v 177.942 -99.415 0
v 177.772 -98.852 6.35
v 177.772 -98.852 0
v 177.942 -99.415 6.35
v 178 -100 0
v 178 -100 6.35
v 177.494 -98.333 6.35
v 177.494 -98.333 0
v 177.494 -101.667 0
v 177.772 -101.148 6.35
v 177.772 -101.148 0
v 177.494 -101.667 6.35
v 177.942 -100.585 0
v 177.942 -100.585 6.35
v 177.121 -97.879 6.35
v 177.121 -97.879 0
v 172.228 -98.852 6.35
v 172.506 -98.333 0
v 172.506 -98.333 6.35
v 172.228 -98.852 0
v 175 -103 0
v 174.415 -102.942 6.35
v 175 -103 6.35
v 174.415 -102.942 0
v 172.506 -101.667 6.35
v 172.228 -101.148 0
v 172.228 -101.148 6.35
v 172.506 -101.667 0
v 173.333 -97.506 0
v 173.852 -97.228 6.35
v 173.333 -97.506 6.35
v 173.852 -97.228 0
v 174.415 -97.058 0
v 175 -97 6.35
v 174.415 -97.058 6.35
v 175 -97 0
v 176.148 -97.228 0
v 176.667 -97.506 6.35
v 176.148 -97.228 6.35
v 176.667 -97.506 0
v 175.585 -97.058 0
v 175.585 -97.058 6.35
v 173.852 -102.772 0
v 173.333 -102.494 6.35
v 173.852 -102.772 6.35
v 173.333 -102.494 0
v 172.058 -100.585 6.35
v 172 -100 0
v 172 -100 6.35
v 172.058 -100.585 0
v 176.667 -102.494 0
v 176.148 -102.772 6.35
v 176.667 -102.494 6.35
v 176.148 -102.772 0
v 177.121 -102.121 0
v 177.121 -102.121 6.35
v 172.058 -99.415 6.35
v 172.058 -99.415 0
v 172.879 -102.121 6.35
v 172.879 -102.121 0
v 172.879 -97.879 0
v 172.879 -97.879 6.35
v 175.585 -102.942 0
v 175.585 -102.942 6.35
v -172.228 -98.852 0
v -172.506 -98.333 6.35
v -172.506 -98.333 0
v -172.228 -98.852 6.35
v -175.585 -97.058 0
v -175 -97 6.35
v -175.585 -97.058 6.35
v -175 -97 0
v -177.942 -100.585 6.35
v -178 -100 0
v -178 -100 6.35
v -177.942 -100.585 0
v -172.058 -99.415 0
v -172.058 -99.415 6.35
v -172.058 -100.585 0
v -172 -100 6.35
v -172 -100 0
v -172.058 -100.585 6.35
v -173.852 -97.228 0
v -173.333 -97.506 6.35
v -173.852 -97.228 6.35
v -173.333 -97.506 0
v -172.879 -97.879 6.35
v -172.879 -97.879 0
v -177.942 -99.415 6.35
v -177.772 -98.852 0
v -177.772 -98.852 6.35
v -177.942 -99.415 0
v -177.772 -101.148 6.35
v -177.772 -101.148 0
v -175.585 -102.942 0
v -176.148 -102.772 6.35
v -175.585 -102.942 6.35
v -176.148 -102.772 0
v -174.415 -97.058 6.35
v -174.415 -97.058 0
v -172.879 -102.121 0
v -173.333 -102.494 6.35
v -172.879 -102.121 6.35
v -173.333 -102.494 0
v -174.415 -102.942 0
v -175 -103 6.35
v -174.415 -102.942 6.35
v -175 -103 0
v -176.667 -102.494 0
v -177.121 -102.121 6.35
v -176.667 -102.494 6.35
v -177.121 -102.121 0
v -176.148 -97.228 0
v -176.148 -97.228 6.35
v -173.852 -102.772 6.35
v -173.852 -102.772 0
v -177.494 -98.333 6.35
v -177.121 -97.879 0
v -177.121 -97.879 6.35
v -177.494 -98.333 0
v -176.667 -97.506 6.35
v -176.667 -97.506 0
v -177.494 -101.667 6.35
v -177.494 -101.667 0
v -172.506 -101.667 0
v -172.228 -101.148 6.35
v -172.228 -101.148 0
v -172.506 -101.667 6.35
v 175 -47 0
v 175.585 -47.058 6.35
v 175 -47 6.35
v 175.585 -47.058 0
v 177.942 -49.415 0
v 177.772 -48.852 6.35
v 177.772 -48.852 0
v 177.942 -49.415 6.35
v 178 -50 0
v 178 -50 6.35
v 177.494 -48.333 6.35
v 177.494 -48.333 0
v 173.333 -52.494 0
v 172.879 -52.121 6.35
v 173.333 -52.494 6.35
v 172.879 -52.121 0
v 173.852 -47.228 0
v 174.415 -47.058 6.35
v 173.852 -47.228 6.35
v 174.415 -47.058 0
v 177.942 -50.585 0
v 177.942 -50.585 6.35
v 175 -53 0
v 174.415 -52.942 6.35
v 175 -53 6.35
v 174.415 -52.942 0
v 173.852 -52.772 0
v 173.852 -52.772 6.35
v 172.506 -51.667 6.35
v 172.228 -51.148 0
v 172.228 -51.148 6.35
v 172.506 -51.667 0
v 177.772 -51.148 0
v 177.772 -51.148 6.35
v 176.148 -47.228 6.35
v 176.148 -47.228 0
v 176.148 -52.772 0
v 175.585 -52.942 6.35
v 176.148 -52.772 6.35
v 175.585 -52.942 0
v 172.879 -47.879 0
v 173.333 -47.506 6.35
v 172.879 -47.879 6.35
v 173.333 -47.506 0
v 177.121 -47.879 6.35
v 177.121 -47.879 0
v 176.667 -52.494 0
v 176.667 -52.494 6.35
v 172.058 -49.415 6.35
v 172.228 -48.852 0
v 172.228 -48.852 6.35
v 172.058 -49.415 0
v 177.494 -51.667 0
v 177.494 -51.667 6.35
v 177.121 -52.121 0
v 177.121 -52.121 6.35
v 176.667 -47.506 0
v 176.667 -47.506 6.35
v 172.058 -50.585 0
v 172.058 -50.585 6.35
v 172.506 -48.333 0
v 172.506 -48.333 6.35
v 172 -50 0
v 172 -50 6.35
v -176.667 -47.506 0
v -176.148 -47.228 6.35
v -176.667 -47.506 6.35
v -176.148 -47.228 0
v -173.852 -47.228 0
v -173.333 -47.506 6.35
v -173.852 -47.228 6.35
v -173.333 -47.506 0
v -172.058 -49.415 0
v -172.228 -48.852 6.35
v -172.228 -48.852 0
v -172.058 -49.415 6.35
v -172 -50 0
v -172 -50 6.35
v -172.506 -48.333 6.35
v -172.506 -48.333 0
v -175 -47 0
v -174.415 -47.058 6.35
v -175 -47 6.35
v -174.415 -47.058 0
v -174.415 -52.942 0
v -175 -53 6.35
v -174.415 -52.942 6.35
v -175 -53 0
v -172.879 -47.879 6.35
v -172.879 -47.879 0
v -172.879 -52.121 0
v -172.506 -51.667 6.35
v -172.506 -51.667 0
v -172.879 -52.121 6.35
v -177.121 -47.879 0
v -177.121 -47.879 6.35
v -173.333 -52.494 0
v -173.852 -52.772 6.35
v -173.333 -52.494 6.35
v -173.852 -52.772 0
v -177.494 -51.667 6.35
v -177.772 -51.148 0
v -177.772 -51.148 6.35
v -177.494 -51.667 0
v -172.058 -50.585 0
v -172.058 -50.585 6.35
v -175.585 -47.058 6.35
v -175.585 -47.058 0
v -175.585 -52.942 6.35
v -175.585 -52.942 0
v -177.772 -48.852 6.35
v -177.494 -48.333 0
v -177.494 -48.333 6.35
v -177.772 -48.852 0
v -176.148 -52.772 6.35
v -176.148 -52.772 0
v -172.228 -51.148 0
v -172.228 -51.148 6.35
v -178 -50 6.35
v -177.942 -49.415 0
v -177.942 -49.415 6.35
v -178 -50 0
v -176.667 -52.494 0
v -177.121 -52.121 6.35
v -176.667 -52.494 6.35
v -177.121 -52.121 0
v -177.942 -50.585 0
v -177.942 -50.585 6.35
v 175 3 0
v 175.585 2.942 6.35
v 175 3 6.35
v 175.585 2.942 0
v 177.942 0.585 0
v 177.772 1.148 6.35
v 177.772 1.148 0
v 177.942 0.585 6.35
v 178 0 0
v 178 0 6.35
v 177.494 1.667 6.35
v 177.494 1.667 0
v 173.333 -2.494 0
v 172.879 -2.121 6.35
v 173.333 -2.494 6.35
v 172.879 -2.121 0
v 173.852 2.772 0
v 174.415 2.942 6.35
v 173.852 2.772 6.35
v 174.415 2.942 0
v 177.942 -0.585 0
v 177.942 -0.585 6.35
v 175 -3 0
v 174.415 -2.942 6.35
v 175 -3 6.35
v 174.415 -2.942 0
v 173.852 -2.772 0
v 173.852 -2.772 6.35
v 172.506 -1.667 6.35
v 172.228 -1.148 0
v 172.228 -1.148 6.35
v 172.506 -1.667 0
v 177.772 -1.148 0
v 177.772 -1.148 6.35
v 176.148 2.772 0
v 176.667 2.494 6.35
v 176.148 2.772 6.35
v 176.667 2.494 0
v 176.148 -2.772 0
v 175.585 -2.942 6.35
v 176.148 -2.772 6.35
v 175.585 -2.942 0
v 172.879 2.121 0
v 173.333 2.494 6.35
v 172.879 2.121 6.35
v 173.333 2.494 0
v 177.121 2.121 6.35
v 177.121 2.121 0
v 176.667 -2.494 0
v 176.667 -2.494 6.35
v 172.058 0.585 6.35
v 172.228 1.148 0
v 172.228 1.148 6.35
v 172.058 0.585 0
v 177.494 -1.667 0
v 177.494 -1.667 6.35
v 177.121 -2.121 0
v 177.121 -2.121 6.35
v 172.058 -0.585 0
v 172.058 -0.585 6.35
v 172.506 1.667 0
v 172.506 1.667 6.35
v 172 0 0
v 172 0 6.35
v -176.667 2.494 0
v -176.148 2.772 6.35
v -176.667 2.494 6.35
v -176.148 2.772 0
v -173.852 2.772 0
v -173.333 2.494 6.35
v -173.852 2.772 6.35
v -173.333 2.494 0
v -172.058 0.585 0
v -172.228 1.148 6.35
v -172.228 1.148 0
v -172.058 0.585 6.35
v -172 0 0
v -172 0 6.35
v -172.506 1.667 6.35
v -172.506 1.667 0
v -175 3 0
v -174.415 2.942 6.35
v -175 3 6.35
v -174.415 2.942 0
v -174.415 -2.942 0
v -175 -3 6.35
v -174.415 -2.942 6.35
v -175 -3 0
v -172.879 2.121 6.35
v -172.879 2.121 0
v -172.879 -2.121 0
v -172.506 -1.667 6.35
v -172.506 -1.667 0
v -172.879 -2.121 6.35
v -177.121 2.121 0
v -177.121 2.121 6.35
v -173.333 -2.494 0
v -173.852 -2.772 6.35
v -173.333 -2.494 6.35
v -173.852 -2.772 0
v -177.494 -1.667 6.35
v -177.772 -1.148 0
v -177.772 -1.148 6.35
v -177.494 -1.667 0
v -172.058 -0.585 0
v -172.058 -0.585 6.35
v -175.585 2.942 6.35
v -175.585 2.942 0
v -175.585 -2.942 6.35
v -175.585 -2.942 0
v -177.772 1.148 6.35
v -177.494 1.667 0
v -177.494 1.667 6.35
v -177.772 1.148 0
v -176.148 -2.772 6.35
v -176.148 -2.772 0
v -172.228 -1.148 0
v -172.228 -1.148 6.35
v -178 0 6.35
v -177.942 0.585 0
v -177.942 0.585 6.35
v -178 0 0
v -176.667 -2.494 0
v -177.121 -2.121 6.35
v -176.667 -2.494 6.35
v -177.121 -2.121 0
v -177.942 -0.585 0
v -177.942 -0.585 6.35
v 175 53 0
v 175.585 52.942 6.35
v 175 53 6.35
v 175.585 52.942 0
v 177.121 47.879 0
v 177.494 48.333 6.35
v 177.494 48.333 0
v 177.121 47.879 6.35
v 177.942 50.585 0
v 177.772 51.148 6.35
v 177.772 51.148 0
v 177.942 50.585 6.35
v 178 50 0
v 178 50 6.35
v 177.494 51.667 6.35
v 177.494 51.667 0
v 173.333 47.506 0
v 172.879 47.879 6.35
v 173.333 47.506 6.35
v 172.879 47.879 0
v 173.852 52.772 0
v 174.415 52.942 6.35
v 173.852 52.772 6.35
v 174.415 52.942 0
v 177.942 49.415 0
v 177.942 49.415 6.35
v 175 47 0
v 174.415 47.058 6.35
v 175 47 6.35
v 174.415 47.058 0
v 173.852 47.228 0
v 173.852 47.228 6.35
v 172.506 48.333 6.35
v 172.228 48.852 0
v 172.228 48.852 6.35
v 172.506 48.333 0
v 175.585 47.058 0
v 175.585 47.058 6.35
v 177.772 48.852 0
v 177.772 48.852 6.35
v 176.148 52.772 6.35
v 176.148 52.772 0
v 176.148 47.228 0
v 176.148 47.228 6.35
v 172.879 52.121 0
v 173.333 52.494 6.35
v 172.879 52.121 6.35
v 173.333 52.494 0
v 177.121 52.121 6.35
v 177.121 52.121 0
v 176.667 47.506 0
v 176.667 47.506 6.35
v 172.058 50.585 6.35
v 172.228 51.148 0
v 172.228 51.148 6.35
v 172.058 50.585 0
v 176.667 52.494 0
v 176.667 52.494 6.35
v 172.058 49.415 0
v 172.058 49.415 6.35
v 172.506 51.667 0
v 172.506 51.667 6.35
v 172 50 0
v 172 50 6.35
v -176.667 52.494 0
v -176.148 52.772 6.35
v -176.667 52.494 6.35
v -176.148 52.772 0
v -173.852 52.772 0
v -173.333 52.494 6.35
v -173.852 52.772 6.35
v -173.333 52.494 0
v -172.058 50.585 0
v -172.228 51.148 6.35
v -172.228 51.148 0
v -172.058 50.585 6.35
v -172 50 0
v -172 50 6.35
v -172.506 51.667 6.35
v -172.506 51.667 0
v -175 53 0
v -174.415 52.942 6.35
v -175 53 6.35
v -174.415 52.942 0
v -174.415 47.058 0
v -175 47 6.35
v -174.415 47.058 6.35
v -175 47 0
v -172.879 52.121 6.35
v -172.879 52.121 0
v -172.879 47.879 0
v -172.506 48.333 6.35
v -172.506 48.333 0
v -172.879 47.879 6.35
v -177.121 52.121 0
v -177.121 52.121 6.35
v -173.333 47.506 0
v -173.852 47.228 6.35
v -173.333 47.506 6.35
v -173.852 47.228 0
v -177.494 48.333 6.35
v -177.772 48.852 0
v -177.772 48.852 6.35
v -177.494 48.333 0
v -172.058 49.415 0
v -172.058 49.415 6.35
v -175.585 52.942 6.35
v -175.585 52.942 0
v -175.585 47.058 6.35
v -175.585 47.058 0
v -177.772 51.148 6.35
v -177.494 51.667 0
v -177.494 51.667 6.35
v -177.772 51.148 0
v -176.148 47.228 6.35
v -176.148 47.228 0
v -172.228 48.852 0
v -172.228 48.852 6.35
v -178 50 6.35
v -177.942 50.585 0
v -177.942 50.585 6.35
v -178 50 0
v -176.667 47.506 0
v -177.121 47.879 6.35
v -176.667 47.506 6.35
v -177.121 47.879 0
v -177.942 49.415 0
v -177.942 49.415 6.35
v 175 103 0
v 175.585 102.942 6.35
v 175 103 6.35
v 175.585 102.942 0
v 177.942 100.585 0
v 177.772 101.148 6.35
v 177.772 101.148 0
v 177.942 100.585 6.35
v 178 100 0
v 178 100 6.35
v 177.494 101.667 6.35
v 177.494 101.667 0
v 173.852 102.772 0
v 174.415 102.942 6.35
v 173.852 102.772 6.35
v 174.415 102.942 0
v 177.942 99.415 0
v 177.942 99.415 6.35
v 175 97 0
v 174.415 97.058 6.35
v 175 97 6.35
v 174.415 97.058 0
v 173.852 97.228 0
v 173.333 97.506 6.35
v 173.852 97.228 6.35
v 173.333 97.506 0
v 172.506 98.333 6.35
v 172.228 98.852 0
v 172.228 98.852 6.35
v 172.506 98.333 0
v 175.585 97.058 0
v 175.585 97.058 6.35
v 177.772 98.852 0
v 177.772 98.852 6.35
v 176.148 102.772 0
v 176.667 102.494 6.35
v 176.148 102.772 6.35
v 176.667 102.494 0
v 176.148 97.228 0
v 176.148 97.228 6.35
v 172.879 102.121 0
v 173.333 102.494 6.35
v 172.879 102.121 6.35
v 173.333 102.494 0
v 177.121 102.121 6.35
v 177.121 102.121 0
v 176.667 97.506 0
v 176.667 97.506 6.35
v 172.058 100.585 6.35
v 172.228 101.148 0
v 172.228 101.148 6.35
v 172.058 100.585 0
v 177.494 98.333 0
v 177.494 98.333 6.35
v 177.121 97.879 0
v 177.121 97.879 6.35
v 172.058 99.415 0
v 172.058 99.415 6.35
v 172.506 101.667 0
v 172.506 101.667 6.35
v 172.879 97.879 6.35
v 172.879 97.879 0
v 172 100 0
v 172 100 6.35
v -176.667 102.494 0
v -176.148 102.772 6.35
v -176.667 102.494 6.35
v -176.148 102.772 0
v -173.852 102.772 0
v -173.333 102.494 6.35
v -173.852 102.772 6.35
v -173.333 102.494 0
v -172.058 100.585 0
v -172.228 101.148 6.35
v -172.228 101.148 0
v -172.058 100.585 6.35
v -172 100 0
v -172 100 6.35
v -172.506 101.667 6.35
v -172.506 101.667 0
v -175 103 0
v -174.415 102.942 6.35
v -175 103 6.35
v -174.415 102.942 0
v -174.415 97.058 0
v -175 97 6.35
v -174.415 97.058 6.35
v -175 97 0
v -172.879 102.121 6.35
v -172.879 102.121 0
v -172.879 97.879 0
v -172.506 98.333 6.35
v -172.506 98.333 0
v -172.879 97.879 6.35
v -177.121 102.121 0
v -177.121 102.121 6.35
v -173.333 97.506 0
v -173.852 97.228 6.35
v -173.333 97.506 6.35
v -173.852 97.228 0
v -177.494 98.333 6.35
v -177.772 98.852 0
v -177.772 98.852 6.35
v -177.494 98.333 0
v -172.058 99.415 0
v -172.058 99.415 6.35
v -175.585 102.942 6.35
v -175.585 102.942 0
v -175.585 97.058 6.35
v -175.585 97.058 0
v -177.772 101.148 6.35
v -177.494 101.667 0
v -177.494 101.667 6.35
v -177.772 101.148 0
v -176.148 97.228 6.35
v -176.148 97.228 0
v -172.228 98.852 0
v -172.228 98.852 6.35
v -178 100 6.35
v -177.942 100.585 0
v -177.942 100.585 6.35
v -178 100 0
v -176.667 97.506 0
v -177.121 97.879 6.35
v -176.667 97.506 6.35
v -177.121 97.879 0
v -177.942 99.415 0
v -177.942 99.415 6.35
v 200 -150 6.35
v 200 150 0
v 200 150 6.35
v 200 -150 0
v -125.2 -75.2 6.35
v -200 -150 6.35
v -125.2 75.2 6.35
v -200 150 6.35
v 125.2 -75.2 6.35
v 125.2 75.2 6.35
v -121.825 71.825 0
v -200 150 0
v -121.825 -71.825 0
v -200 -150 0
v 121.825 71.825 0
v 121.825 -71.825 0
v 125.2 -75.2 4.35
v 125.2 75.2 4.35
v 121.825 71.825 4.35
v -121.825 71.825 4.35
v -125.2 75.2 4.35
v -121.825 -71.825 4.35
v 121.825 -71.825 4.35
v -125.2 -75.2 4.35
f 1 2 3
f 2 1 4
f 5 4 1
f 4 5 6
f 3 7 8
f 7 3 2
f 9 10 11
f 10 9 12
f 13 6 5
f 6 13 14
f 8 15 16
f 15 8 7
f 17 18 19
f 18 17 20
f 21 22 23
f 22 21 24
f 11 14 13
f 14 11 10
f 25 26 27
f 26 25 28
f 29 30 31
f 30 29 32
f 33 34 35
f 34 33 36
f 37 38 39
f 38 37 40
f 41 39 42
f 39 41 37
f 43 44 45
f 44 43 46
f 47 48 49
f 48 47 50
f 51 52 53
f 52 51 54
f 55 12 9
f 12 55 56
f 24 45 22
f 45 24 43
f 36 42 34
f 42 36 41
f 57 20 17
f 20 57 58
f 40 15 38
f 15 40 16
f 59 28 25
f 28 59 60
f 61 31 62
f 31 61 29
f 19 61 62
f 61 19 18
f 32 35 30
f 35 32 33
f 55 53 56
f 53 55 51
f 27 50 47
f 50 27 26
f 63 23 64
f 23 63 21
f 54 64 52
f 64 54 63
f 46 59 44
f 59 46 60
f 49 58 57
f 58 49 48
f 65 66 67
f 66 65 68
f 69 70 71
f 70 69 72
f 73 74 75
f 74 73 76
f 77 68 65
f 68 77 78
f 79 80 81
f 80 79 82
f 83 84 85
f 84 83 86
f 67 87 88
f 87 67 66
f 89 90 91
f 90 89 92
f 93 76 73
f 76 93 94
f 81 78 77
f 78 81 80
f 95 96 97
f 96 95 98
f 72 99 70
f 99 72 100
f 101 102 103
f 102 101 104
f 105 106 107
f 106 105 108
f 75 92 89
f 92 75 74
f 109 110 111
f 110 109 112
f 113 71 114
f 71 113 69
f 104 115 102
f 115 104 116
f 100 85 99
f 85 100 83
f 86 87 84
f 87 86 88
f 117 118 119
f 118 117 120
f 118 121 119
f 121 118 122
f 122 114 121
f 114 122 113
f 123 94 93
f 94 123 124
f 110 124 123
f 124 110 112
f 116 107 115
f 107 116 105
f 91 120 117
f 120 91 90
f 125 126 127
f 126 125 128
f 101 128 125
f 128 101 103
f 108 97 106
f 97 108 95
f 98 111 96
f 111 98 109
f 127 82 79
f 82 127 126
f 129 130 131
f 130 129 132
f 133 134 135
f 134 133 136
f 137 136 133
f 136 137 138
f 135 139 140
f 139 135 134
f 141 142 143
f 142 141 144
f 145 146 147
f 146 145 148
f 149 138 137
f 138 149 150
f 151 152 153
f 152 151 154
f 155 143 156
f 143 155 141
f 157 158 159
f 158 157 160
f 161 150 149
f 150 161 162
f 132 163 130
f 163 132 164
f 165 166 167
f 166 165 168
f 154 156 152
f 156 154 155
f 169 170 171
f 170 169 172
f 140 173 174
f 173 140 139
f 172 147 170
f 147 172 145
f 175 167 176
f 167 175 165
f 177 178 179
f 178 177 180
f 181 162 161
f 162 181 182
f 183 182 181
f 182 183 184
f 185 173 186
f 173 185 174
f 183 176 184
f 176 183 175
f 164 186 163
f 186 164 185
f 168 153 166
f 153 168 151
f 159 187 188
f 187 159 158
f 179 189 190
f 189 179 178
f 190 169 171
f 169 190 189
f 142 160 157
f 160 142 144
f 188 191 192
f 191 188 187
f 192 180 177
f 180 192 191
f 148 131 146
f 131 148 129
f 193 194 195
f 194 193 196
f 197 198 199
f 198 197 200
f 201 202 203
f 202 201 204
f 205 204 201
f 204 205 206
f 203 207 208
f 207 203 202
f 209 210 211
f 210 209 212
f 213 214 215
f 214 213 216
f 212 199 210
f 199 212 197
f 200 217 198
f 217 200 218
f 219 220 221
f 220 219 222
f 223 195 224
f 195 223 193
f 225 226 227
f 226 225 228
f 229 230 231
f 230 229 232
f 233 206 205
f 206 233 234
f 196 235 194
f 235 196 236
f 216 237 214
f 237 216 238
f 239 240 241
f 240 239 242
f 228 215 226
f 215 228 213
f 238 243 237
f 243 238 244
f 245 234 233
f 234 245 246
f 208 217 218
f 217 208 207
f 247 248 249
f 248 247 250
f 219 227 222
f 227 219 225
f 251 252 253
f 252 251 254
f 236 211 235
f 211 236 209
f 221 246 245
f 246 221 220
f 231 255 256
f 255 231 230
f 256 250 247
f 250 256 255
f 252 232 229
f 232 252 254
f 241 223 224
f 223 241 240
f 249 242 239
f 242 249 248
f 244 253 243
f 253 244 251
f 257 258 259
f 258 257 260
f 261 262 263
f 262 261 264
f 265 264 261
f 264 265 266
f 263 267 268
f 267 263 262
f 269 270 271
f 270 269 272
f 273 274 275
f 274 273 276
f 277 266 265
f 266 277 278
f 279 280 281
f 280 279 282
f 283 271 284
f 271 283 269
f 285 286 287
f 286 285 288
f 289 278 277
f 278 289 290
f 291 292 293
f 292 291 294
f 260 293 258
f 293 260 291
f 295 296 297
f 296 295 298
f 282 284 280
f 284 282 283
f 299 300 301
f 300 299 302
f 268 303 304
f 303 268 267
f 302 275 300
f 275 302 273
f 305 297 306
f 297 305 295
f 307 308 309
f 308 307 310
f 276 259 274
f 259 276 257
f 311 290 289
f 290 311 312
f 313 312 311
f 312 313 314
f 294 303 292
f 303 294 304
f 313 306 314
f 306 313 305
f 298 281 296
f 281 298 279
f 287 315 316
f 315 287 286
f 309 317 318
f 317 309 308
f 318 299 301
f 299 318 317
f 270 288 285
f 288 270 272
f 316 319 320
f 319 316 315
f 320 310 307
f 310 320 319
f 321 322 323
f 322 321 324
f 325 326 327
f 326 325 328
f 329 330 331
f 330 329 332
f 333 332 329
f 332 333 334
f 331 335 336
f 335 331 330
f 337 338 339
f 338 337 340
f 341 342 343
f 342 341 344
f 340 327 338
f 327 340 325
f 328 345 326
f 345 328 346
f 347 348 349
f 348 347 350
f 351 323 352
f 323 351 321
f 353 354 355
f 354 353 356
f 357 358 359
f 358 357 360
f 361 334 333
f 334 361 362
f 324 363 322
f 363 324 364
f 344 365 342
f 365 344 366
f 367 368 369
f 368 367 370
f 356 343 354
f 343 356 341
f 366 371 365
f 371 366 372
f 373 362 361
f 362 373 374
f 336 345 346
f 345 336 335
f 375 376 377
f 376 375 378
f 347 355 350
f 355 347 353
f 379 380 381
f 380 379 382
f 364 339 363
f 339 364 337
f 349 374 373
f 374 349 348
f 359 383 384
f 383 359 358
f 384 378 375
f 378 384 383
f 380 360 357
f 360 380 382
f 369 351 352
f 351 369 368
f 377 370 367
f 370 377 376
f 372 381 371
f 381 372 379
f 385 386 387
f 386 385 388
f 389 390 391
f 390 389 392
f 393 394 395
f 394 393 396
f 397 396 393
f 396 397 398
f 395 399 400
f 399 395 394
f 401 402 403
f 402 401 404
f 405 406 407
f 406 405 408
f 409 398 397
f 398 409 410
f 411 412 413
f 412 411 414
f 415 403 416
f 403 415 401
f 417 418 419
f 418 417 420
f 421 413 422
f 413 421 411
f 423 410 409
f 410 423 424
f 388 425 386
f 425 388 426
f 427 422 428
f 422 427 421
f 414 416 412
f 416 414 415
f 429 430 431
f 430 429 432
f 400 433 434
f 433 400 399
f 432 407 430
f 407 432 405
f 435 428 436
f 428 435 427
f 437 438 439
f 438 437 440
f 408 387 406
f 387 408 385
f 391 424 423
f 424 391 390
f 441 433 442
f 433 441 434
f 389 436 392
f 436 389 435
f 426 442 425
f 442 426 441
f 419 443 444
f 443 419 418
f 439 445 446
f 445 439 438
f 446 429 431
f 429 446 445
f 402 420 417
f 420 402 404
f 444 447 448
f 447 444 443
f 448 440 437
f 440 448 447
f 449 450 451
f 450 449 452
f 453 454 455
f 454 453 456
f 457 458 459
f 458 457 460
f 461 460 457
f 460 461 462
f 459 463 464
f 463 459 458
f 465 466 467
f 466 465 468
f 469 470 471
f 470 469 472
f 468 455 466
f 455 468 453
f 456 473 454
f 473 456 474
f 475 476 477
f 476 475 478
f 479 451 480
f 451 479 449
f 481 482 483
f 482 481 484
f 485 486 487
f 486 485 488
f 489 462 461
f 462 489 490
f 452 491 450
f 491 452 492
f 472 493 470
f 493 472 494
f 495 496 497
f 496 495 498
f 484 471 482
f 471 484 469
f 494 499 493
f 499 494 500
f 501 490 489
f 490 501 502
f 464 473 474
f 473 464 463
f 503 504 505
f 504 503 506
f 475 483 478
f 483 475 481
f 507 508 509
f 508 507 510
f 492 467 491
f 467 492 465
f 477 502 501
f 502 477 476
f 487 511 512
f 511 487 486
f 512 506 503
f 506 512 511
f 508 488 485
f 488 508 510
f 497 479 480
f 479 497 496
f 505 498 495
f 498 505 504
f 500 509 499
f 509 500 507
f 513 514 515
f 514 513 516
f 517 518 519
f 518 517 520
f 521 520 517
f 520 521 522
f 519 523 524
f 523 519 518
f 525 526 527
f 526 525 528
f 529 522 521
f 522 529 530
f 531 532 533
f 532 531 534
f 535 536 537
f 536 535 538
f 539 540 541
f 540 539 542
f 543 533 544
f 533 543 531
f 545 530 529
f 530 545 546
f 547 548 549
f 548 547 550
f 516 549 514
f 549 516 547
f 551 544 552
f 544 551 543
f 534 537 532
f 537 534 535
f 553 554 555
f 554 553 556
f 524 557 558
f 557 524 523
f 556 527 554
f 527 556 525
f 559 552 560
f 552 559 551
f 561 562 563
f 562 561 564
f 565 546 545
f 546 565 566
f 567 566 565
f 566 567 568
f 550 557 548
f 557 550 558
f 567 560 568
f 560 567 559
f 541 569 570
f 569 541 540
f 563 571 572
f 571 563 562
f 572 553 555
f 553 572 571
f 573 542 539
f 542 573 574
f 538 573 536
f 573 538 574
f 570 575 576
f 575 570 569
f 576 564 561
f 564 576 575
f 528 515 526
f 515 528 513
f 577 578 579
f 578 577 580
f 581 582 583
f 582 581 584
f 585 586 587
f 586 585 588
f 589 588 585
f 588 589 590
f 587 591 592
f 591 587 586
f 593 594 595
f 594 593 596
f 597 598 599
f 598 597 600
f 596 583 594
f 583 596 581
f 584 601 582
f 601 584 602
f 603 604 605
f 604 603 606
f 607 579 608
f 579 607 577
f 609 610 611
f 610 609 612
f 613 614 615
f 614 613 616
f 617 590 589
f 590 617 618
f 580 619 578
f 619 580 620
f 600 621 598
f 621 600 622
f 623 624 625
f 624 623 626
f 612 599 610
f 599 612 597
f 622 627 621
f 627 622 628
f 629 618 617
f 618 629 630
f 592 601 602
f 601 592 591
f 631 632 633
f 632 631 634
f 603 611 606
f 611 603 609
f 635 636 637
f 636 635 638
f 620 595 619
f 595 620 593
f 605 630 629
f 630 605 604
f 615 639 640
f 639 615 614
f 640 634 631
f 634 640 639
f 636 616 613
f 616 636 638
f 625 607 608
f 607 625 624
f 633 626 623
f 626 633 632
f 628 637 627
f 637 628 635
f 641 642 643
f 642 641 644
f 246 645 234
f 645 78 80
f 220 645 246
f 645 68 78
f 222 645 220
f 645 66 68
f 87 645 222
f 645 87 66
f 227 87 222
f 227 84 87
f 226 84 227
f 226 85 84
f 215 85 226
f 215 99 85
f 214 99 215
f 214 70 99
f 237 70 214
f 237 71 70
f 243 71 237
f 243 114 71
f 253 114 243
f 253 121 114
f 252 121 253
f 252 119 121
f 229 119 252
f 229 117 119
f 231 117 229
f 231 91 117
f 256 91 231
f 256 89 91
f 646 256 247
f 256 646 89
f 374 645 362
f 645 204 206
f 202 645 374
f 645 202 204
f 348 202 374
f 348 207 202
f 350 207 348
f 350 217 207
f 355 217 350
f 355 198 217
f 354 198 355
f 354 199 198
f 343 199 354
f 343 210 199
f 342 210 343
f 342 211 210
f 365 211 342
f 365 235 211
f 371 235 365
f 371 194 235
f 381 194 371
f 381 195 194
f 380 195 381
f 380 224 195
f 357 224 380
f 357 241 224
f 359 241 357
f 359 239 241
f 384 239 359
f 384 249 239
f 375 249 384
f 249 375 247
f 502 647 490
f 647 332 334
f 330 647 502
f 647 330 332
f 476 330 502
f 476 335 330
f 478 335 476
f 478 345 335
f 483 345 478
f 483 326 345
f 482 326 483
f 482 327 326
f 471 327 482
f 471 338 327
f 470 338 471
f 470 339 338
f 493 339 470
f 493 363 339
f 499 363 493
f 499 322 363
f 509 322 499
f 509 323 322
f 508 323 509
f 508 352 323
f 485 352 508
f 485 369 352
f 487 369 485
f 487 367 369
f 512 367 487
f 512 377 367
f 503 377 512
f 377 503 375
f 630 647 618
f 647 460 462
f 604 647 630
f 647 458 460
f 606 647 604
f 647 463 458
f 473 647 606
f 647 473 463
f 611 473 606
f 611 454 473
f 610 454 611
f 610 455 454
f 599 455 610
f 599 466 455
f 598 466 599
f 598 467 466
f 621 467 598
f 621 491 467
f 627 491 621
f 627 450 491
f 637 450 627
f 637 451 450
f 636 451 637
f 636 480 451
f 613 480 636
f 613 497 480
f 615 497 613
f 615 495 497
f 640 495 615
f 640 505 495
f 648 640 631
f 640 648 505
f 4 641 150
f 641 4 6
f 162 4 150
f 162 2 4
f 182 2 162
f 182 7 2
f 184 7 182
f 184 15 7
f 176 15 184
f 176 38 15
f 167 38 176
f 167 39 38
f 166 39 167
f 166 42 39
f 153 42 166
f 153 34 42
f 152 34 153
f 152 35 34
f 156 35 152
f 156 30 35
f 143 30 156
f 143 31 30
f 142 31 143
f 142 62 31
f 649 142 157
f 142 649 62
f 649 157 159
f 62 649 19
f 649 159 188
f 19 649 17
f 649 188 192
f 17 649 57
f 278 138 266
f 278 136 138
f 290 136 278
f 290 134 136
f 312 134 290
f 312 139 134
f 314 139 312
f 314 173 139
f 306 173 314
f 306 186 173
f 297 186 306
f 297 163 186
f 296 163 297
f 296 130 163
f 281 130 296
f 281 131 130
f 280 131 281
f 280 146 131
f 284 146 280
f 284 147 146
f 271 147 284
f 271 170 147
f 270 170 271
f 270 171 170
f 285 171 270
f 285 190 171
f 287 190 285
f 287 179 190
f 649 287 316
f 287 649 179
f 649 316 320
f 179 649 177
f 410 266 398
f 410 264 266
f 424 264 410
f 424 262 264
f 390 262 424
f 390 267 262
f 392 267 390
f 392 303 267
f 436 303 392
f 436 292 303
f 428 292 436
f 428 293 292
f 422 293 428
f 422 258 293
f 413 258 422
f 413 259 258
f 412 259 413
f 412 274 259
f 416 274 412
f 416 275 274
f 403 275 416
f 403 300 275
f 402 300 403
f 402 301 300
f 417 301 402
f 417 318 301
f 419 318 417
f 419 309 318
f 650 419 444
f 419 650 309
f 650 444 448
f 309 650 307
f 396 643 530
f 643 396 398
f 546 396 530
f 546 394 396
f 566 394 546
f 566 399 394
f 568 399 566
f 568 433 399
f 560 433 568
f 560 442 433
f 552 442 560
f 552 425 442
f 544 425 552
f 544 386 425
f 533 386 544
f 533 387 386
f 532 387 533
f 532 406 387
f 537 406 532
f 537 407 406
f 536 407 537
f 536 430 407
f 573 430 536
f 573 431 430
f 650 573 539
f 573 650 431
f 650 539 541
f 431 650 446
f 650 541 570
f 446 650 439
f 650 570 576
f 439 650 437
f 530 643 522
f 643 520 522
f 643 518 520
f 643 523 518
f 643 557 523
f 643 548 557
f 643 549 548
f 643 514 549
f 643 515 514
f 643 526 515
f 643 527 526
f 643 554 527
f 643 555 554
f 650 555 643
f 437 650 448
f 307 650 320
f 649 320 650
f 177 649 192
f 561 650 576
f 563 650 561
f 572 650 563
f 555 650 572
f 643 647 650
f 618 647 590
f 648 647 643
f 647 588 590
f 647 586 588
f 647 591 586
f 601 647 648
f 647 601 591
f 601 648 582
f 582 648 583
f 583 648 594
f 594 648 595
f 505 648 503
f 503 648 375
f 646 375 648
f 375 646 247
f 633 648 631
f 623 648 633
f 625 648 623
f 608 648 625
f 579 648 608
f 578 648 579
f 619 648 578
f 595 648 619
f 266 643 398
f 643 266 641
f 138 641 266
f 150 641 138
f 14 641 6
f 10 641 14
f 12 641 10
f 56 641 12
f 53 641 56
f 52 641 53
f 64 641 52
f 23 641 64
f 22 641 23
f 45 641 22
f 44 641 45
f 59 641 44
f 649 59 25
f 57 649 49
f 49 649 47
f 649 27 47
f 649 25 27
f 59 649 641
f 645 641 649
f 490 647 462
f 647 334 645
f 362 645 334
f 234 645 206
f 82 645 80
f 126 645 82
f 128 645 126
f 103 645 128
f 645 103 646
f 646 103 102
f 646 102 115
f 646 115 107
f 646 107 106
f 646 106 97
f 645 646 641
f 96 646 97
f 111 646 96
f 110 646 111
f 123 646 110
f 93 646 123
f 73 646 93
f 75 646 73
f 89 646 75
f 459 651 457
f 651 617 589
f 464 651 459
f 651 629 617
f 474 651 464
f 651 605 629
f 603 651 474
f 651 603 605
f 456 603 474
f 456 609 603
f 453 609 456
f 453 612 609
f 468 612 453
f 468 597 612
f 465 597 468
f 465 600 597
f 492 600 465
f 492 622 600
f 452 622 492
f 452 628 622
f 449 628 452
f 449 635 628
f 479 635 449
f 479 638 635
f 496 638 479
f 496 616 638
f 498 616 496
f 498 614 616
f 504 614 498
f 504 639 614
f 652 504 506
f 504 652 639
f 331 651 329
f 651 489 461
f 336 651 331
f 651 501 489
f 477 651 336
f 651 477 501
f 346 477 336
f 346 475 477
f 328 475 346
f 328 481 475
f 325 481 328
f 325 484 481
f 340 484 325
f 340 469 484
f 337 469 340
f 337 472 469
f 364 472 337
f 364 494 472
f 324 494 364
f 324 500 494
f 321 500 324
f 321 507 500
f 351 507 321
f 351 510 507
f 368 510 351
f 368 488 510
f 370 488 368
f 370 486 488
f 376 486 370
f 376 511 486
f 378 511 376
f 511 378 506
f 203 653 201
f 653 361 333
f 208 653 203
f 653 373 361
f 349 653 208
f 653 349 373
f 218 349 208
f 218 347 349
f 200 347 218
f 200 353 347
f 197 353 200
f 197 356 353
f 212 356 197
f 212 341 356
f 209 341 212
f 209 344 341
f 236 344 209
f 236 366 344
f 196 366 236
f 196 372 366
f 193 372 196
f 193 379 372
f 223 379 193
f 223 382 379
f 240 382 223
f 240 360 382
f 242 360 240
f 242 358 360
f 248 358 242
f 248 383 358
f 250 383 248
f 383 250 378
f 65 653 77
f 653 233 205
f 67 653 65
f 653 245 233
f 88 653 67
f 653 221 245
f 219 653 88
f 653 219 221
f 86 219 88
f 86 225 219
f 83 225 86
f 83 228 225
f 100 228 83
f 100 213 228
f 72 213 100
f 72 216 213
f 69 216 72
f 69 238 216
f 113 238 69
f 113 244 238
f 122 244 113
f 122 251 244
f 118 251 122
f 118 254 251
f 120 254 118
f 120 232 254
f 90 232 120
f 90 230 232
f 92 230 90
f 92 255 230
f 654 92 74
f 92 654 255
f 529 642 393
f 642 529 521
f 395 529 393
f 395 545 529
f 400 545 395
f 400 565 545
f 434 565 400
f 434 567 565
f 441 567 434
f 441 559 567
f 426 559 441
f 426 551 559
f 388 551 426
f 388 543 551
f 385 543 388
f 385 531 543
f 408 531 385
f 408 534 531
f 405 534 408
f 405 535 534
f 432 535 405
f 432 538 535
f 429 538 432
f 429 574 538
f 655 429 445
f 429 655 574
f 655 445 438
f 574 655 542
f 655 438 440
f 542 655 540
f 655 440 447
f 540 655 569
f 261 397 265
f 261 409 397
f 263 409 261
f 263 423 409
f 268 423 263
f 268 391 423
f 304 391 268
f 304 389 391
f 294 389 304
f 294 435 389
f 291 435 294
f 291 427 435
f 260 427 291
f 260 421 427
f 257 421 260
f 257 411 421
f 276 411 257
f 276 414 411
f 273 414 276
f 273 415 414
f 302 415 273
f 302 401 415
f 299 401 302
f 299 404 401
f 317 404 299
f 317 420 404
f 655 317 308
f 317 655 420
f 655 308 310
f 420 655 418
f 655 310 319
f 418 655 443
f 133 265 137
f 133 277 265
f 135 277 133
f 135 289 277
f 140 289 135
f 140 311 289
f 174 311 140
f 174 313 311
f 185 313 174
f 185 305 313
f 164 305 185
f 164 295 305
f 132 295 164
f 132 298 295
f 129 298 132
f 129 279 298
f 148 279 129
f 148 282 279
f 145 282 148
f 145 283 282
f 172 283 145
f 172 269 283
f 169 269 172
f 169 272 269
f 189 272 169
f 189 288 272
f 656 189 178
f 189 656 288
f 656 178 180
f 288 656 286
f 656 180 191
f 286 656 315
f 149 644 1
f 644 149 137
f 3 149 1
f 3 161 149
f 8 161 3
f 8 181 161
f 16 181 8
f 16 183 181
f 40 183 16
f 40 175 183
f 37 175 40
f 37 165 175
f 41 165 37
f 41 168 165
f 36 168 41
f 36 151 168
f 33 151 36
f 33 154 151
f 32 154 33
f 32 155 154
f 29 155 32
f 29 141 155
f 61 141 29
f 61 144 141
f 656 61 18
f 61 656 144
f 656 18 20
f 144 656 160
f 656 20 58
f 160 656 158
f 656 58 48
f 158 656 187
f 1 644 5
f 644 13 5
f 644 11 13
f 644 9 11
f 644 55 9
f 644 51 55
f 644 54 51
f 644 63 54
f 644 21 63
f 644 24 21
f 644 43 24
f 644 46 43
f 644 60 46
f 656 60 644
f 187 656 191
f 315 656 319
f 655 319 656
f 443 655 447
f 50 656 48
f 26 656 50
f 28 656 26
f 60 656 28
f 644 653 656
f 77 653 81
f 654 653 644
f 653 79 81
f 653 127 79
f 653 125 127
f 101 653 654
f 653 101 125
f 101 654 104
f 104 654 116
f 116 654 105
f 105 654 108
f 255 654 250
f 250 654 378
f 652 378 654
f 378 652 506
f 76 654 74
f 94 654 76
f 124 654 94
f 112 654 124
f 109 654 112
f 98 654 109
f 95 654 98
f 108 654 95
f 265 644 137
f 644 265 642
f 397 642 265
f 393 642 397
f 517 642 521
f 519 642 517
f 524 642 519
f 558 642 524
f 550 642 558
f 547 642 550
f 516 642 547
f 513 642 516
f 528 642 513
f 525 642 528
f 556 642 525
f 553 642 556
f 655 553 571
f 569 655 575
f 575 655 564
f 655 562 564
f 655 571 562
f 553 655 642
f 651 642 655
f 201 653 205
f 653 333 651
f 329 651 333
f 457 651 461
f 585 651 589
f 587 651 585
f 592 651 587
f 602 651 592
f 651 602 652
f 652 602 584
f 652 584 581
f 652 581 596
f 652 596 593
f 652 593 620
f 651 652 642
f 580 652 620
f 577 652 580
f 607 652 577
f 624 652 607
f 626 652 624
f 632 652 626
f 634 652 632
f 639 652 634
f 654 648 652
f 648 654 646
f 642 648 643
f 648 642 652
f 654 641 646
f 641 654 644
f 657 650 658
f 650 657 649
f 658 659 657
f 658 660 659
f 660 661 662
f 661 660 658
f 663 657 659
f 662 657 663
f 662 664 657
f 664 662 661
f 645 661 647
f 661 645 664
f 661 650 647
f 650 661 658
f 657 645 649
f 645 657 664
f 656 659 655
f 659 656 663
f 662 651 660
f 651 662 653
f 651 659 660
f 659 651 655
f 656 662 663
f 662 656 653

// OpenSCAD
inch = 25.4;
width = 400;
height = 300;
thickness = inch / 4;
tollerance = 0.2;

cut_thickness = 2;
cut_width = 250;
cut_height = 150;
cut_support = inch / 8;
hole_diameter = 6;
holes_per_side = 5;
holes_coverage = 200;
holes_distance = 350;

module support(width, height, thickness) {
  color([0,0,0,0.75]) {
    difference() {
      cube([width, height, thickness], center=true);

      translate([0,0,thickness-cut_thickness])
        cube([cut_width + tollerance * 2, cut_height + tollerance * 2, thickness], center=true);
      cube([cut_width - cut_support * 2, cut_height - cut_support * 2, thickness * 2], center=true);

      $fn = 32;
      dist = holes_coverage / (holes_per_side - 1);
      for(y = [0 : holes_per_side - 1]) {
        translate([0, -holes_coverage / 2 + y * dist, 0]) {
          translate([  holes_distance / 2, 0, 0])
            cylinder(h = thickness * 2, r = hole_diameter / 2, center = true);
          translate([- holes_distance / 2, 0, 0])
            cylinder(h = thickness * 2, r = hole_diameter / 2, center = true);
        }
      }
    }
  }
}

translate([0,0,thickness/2])
  support(width, height, thickness);
